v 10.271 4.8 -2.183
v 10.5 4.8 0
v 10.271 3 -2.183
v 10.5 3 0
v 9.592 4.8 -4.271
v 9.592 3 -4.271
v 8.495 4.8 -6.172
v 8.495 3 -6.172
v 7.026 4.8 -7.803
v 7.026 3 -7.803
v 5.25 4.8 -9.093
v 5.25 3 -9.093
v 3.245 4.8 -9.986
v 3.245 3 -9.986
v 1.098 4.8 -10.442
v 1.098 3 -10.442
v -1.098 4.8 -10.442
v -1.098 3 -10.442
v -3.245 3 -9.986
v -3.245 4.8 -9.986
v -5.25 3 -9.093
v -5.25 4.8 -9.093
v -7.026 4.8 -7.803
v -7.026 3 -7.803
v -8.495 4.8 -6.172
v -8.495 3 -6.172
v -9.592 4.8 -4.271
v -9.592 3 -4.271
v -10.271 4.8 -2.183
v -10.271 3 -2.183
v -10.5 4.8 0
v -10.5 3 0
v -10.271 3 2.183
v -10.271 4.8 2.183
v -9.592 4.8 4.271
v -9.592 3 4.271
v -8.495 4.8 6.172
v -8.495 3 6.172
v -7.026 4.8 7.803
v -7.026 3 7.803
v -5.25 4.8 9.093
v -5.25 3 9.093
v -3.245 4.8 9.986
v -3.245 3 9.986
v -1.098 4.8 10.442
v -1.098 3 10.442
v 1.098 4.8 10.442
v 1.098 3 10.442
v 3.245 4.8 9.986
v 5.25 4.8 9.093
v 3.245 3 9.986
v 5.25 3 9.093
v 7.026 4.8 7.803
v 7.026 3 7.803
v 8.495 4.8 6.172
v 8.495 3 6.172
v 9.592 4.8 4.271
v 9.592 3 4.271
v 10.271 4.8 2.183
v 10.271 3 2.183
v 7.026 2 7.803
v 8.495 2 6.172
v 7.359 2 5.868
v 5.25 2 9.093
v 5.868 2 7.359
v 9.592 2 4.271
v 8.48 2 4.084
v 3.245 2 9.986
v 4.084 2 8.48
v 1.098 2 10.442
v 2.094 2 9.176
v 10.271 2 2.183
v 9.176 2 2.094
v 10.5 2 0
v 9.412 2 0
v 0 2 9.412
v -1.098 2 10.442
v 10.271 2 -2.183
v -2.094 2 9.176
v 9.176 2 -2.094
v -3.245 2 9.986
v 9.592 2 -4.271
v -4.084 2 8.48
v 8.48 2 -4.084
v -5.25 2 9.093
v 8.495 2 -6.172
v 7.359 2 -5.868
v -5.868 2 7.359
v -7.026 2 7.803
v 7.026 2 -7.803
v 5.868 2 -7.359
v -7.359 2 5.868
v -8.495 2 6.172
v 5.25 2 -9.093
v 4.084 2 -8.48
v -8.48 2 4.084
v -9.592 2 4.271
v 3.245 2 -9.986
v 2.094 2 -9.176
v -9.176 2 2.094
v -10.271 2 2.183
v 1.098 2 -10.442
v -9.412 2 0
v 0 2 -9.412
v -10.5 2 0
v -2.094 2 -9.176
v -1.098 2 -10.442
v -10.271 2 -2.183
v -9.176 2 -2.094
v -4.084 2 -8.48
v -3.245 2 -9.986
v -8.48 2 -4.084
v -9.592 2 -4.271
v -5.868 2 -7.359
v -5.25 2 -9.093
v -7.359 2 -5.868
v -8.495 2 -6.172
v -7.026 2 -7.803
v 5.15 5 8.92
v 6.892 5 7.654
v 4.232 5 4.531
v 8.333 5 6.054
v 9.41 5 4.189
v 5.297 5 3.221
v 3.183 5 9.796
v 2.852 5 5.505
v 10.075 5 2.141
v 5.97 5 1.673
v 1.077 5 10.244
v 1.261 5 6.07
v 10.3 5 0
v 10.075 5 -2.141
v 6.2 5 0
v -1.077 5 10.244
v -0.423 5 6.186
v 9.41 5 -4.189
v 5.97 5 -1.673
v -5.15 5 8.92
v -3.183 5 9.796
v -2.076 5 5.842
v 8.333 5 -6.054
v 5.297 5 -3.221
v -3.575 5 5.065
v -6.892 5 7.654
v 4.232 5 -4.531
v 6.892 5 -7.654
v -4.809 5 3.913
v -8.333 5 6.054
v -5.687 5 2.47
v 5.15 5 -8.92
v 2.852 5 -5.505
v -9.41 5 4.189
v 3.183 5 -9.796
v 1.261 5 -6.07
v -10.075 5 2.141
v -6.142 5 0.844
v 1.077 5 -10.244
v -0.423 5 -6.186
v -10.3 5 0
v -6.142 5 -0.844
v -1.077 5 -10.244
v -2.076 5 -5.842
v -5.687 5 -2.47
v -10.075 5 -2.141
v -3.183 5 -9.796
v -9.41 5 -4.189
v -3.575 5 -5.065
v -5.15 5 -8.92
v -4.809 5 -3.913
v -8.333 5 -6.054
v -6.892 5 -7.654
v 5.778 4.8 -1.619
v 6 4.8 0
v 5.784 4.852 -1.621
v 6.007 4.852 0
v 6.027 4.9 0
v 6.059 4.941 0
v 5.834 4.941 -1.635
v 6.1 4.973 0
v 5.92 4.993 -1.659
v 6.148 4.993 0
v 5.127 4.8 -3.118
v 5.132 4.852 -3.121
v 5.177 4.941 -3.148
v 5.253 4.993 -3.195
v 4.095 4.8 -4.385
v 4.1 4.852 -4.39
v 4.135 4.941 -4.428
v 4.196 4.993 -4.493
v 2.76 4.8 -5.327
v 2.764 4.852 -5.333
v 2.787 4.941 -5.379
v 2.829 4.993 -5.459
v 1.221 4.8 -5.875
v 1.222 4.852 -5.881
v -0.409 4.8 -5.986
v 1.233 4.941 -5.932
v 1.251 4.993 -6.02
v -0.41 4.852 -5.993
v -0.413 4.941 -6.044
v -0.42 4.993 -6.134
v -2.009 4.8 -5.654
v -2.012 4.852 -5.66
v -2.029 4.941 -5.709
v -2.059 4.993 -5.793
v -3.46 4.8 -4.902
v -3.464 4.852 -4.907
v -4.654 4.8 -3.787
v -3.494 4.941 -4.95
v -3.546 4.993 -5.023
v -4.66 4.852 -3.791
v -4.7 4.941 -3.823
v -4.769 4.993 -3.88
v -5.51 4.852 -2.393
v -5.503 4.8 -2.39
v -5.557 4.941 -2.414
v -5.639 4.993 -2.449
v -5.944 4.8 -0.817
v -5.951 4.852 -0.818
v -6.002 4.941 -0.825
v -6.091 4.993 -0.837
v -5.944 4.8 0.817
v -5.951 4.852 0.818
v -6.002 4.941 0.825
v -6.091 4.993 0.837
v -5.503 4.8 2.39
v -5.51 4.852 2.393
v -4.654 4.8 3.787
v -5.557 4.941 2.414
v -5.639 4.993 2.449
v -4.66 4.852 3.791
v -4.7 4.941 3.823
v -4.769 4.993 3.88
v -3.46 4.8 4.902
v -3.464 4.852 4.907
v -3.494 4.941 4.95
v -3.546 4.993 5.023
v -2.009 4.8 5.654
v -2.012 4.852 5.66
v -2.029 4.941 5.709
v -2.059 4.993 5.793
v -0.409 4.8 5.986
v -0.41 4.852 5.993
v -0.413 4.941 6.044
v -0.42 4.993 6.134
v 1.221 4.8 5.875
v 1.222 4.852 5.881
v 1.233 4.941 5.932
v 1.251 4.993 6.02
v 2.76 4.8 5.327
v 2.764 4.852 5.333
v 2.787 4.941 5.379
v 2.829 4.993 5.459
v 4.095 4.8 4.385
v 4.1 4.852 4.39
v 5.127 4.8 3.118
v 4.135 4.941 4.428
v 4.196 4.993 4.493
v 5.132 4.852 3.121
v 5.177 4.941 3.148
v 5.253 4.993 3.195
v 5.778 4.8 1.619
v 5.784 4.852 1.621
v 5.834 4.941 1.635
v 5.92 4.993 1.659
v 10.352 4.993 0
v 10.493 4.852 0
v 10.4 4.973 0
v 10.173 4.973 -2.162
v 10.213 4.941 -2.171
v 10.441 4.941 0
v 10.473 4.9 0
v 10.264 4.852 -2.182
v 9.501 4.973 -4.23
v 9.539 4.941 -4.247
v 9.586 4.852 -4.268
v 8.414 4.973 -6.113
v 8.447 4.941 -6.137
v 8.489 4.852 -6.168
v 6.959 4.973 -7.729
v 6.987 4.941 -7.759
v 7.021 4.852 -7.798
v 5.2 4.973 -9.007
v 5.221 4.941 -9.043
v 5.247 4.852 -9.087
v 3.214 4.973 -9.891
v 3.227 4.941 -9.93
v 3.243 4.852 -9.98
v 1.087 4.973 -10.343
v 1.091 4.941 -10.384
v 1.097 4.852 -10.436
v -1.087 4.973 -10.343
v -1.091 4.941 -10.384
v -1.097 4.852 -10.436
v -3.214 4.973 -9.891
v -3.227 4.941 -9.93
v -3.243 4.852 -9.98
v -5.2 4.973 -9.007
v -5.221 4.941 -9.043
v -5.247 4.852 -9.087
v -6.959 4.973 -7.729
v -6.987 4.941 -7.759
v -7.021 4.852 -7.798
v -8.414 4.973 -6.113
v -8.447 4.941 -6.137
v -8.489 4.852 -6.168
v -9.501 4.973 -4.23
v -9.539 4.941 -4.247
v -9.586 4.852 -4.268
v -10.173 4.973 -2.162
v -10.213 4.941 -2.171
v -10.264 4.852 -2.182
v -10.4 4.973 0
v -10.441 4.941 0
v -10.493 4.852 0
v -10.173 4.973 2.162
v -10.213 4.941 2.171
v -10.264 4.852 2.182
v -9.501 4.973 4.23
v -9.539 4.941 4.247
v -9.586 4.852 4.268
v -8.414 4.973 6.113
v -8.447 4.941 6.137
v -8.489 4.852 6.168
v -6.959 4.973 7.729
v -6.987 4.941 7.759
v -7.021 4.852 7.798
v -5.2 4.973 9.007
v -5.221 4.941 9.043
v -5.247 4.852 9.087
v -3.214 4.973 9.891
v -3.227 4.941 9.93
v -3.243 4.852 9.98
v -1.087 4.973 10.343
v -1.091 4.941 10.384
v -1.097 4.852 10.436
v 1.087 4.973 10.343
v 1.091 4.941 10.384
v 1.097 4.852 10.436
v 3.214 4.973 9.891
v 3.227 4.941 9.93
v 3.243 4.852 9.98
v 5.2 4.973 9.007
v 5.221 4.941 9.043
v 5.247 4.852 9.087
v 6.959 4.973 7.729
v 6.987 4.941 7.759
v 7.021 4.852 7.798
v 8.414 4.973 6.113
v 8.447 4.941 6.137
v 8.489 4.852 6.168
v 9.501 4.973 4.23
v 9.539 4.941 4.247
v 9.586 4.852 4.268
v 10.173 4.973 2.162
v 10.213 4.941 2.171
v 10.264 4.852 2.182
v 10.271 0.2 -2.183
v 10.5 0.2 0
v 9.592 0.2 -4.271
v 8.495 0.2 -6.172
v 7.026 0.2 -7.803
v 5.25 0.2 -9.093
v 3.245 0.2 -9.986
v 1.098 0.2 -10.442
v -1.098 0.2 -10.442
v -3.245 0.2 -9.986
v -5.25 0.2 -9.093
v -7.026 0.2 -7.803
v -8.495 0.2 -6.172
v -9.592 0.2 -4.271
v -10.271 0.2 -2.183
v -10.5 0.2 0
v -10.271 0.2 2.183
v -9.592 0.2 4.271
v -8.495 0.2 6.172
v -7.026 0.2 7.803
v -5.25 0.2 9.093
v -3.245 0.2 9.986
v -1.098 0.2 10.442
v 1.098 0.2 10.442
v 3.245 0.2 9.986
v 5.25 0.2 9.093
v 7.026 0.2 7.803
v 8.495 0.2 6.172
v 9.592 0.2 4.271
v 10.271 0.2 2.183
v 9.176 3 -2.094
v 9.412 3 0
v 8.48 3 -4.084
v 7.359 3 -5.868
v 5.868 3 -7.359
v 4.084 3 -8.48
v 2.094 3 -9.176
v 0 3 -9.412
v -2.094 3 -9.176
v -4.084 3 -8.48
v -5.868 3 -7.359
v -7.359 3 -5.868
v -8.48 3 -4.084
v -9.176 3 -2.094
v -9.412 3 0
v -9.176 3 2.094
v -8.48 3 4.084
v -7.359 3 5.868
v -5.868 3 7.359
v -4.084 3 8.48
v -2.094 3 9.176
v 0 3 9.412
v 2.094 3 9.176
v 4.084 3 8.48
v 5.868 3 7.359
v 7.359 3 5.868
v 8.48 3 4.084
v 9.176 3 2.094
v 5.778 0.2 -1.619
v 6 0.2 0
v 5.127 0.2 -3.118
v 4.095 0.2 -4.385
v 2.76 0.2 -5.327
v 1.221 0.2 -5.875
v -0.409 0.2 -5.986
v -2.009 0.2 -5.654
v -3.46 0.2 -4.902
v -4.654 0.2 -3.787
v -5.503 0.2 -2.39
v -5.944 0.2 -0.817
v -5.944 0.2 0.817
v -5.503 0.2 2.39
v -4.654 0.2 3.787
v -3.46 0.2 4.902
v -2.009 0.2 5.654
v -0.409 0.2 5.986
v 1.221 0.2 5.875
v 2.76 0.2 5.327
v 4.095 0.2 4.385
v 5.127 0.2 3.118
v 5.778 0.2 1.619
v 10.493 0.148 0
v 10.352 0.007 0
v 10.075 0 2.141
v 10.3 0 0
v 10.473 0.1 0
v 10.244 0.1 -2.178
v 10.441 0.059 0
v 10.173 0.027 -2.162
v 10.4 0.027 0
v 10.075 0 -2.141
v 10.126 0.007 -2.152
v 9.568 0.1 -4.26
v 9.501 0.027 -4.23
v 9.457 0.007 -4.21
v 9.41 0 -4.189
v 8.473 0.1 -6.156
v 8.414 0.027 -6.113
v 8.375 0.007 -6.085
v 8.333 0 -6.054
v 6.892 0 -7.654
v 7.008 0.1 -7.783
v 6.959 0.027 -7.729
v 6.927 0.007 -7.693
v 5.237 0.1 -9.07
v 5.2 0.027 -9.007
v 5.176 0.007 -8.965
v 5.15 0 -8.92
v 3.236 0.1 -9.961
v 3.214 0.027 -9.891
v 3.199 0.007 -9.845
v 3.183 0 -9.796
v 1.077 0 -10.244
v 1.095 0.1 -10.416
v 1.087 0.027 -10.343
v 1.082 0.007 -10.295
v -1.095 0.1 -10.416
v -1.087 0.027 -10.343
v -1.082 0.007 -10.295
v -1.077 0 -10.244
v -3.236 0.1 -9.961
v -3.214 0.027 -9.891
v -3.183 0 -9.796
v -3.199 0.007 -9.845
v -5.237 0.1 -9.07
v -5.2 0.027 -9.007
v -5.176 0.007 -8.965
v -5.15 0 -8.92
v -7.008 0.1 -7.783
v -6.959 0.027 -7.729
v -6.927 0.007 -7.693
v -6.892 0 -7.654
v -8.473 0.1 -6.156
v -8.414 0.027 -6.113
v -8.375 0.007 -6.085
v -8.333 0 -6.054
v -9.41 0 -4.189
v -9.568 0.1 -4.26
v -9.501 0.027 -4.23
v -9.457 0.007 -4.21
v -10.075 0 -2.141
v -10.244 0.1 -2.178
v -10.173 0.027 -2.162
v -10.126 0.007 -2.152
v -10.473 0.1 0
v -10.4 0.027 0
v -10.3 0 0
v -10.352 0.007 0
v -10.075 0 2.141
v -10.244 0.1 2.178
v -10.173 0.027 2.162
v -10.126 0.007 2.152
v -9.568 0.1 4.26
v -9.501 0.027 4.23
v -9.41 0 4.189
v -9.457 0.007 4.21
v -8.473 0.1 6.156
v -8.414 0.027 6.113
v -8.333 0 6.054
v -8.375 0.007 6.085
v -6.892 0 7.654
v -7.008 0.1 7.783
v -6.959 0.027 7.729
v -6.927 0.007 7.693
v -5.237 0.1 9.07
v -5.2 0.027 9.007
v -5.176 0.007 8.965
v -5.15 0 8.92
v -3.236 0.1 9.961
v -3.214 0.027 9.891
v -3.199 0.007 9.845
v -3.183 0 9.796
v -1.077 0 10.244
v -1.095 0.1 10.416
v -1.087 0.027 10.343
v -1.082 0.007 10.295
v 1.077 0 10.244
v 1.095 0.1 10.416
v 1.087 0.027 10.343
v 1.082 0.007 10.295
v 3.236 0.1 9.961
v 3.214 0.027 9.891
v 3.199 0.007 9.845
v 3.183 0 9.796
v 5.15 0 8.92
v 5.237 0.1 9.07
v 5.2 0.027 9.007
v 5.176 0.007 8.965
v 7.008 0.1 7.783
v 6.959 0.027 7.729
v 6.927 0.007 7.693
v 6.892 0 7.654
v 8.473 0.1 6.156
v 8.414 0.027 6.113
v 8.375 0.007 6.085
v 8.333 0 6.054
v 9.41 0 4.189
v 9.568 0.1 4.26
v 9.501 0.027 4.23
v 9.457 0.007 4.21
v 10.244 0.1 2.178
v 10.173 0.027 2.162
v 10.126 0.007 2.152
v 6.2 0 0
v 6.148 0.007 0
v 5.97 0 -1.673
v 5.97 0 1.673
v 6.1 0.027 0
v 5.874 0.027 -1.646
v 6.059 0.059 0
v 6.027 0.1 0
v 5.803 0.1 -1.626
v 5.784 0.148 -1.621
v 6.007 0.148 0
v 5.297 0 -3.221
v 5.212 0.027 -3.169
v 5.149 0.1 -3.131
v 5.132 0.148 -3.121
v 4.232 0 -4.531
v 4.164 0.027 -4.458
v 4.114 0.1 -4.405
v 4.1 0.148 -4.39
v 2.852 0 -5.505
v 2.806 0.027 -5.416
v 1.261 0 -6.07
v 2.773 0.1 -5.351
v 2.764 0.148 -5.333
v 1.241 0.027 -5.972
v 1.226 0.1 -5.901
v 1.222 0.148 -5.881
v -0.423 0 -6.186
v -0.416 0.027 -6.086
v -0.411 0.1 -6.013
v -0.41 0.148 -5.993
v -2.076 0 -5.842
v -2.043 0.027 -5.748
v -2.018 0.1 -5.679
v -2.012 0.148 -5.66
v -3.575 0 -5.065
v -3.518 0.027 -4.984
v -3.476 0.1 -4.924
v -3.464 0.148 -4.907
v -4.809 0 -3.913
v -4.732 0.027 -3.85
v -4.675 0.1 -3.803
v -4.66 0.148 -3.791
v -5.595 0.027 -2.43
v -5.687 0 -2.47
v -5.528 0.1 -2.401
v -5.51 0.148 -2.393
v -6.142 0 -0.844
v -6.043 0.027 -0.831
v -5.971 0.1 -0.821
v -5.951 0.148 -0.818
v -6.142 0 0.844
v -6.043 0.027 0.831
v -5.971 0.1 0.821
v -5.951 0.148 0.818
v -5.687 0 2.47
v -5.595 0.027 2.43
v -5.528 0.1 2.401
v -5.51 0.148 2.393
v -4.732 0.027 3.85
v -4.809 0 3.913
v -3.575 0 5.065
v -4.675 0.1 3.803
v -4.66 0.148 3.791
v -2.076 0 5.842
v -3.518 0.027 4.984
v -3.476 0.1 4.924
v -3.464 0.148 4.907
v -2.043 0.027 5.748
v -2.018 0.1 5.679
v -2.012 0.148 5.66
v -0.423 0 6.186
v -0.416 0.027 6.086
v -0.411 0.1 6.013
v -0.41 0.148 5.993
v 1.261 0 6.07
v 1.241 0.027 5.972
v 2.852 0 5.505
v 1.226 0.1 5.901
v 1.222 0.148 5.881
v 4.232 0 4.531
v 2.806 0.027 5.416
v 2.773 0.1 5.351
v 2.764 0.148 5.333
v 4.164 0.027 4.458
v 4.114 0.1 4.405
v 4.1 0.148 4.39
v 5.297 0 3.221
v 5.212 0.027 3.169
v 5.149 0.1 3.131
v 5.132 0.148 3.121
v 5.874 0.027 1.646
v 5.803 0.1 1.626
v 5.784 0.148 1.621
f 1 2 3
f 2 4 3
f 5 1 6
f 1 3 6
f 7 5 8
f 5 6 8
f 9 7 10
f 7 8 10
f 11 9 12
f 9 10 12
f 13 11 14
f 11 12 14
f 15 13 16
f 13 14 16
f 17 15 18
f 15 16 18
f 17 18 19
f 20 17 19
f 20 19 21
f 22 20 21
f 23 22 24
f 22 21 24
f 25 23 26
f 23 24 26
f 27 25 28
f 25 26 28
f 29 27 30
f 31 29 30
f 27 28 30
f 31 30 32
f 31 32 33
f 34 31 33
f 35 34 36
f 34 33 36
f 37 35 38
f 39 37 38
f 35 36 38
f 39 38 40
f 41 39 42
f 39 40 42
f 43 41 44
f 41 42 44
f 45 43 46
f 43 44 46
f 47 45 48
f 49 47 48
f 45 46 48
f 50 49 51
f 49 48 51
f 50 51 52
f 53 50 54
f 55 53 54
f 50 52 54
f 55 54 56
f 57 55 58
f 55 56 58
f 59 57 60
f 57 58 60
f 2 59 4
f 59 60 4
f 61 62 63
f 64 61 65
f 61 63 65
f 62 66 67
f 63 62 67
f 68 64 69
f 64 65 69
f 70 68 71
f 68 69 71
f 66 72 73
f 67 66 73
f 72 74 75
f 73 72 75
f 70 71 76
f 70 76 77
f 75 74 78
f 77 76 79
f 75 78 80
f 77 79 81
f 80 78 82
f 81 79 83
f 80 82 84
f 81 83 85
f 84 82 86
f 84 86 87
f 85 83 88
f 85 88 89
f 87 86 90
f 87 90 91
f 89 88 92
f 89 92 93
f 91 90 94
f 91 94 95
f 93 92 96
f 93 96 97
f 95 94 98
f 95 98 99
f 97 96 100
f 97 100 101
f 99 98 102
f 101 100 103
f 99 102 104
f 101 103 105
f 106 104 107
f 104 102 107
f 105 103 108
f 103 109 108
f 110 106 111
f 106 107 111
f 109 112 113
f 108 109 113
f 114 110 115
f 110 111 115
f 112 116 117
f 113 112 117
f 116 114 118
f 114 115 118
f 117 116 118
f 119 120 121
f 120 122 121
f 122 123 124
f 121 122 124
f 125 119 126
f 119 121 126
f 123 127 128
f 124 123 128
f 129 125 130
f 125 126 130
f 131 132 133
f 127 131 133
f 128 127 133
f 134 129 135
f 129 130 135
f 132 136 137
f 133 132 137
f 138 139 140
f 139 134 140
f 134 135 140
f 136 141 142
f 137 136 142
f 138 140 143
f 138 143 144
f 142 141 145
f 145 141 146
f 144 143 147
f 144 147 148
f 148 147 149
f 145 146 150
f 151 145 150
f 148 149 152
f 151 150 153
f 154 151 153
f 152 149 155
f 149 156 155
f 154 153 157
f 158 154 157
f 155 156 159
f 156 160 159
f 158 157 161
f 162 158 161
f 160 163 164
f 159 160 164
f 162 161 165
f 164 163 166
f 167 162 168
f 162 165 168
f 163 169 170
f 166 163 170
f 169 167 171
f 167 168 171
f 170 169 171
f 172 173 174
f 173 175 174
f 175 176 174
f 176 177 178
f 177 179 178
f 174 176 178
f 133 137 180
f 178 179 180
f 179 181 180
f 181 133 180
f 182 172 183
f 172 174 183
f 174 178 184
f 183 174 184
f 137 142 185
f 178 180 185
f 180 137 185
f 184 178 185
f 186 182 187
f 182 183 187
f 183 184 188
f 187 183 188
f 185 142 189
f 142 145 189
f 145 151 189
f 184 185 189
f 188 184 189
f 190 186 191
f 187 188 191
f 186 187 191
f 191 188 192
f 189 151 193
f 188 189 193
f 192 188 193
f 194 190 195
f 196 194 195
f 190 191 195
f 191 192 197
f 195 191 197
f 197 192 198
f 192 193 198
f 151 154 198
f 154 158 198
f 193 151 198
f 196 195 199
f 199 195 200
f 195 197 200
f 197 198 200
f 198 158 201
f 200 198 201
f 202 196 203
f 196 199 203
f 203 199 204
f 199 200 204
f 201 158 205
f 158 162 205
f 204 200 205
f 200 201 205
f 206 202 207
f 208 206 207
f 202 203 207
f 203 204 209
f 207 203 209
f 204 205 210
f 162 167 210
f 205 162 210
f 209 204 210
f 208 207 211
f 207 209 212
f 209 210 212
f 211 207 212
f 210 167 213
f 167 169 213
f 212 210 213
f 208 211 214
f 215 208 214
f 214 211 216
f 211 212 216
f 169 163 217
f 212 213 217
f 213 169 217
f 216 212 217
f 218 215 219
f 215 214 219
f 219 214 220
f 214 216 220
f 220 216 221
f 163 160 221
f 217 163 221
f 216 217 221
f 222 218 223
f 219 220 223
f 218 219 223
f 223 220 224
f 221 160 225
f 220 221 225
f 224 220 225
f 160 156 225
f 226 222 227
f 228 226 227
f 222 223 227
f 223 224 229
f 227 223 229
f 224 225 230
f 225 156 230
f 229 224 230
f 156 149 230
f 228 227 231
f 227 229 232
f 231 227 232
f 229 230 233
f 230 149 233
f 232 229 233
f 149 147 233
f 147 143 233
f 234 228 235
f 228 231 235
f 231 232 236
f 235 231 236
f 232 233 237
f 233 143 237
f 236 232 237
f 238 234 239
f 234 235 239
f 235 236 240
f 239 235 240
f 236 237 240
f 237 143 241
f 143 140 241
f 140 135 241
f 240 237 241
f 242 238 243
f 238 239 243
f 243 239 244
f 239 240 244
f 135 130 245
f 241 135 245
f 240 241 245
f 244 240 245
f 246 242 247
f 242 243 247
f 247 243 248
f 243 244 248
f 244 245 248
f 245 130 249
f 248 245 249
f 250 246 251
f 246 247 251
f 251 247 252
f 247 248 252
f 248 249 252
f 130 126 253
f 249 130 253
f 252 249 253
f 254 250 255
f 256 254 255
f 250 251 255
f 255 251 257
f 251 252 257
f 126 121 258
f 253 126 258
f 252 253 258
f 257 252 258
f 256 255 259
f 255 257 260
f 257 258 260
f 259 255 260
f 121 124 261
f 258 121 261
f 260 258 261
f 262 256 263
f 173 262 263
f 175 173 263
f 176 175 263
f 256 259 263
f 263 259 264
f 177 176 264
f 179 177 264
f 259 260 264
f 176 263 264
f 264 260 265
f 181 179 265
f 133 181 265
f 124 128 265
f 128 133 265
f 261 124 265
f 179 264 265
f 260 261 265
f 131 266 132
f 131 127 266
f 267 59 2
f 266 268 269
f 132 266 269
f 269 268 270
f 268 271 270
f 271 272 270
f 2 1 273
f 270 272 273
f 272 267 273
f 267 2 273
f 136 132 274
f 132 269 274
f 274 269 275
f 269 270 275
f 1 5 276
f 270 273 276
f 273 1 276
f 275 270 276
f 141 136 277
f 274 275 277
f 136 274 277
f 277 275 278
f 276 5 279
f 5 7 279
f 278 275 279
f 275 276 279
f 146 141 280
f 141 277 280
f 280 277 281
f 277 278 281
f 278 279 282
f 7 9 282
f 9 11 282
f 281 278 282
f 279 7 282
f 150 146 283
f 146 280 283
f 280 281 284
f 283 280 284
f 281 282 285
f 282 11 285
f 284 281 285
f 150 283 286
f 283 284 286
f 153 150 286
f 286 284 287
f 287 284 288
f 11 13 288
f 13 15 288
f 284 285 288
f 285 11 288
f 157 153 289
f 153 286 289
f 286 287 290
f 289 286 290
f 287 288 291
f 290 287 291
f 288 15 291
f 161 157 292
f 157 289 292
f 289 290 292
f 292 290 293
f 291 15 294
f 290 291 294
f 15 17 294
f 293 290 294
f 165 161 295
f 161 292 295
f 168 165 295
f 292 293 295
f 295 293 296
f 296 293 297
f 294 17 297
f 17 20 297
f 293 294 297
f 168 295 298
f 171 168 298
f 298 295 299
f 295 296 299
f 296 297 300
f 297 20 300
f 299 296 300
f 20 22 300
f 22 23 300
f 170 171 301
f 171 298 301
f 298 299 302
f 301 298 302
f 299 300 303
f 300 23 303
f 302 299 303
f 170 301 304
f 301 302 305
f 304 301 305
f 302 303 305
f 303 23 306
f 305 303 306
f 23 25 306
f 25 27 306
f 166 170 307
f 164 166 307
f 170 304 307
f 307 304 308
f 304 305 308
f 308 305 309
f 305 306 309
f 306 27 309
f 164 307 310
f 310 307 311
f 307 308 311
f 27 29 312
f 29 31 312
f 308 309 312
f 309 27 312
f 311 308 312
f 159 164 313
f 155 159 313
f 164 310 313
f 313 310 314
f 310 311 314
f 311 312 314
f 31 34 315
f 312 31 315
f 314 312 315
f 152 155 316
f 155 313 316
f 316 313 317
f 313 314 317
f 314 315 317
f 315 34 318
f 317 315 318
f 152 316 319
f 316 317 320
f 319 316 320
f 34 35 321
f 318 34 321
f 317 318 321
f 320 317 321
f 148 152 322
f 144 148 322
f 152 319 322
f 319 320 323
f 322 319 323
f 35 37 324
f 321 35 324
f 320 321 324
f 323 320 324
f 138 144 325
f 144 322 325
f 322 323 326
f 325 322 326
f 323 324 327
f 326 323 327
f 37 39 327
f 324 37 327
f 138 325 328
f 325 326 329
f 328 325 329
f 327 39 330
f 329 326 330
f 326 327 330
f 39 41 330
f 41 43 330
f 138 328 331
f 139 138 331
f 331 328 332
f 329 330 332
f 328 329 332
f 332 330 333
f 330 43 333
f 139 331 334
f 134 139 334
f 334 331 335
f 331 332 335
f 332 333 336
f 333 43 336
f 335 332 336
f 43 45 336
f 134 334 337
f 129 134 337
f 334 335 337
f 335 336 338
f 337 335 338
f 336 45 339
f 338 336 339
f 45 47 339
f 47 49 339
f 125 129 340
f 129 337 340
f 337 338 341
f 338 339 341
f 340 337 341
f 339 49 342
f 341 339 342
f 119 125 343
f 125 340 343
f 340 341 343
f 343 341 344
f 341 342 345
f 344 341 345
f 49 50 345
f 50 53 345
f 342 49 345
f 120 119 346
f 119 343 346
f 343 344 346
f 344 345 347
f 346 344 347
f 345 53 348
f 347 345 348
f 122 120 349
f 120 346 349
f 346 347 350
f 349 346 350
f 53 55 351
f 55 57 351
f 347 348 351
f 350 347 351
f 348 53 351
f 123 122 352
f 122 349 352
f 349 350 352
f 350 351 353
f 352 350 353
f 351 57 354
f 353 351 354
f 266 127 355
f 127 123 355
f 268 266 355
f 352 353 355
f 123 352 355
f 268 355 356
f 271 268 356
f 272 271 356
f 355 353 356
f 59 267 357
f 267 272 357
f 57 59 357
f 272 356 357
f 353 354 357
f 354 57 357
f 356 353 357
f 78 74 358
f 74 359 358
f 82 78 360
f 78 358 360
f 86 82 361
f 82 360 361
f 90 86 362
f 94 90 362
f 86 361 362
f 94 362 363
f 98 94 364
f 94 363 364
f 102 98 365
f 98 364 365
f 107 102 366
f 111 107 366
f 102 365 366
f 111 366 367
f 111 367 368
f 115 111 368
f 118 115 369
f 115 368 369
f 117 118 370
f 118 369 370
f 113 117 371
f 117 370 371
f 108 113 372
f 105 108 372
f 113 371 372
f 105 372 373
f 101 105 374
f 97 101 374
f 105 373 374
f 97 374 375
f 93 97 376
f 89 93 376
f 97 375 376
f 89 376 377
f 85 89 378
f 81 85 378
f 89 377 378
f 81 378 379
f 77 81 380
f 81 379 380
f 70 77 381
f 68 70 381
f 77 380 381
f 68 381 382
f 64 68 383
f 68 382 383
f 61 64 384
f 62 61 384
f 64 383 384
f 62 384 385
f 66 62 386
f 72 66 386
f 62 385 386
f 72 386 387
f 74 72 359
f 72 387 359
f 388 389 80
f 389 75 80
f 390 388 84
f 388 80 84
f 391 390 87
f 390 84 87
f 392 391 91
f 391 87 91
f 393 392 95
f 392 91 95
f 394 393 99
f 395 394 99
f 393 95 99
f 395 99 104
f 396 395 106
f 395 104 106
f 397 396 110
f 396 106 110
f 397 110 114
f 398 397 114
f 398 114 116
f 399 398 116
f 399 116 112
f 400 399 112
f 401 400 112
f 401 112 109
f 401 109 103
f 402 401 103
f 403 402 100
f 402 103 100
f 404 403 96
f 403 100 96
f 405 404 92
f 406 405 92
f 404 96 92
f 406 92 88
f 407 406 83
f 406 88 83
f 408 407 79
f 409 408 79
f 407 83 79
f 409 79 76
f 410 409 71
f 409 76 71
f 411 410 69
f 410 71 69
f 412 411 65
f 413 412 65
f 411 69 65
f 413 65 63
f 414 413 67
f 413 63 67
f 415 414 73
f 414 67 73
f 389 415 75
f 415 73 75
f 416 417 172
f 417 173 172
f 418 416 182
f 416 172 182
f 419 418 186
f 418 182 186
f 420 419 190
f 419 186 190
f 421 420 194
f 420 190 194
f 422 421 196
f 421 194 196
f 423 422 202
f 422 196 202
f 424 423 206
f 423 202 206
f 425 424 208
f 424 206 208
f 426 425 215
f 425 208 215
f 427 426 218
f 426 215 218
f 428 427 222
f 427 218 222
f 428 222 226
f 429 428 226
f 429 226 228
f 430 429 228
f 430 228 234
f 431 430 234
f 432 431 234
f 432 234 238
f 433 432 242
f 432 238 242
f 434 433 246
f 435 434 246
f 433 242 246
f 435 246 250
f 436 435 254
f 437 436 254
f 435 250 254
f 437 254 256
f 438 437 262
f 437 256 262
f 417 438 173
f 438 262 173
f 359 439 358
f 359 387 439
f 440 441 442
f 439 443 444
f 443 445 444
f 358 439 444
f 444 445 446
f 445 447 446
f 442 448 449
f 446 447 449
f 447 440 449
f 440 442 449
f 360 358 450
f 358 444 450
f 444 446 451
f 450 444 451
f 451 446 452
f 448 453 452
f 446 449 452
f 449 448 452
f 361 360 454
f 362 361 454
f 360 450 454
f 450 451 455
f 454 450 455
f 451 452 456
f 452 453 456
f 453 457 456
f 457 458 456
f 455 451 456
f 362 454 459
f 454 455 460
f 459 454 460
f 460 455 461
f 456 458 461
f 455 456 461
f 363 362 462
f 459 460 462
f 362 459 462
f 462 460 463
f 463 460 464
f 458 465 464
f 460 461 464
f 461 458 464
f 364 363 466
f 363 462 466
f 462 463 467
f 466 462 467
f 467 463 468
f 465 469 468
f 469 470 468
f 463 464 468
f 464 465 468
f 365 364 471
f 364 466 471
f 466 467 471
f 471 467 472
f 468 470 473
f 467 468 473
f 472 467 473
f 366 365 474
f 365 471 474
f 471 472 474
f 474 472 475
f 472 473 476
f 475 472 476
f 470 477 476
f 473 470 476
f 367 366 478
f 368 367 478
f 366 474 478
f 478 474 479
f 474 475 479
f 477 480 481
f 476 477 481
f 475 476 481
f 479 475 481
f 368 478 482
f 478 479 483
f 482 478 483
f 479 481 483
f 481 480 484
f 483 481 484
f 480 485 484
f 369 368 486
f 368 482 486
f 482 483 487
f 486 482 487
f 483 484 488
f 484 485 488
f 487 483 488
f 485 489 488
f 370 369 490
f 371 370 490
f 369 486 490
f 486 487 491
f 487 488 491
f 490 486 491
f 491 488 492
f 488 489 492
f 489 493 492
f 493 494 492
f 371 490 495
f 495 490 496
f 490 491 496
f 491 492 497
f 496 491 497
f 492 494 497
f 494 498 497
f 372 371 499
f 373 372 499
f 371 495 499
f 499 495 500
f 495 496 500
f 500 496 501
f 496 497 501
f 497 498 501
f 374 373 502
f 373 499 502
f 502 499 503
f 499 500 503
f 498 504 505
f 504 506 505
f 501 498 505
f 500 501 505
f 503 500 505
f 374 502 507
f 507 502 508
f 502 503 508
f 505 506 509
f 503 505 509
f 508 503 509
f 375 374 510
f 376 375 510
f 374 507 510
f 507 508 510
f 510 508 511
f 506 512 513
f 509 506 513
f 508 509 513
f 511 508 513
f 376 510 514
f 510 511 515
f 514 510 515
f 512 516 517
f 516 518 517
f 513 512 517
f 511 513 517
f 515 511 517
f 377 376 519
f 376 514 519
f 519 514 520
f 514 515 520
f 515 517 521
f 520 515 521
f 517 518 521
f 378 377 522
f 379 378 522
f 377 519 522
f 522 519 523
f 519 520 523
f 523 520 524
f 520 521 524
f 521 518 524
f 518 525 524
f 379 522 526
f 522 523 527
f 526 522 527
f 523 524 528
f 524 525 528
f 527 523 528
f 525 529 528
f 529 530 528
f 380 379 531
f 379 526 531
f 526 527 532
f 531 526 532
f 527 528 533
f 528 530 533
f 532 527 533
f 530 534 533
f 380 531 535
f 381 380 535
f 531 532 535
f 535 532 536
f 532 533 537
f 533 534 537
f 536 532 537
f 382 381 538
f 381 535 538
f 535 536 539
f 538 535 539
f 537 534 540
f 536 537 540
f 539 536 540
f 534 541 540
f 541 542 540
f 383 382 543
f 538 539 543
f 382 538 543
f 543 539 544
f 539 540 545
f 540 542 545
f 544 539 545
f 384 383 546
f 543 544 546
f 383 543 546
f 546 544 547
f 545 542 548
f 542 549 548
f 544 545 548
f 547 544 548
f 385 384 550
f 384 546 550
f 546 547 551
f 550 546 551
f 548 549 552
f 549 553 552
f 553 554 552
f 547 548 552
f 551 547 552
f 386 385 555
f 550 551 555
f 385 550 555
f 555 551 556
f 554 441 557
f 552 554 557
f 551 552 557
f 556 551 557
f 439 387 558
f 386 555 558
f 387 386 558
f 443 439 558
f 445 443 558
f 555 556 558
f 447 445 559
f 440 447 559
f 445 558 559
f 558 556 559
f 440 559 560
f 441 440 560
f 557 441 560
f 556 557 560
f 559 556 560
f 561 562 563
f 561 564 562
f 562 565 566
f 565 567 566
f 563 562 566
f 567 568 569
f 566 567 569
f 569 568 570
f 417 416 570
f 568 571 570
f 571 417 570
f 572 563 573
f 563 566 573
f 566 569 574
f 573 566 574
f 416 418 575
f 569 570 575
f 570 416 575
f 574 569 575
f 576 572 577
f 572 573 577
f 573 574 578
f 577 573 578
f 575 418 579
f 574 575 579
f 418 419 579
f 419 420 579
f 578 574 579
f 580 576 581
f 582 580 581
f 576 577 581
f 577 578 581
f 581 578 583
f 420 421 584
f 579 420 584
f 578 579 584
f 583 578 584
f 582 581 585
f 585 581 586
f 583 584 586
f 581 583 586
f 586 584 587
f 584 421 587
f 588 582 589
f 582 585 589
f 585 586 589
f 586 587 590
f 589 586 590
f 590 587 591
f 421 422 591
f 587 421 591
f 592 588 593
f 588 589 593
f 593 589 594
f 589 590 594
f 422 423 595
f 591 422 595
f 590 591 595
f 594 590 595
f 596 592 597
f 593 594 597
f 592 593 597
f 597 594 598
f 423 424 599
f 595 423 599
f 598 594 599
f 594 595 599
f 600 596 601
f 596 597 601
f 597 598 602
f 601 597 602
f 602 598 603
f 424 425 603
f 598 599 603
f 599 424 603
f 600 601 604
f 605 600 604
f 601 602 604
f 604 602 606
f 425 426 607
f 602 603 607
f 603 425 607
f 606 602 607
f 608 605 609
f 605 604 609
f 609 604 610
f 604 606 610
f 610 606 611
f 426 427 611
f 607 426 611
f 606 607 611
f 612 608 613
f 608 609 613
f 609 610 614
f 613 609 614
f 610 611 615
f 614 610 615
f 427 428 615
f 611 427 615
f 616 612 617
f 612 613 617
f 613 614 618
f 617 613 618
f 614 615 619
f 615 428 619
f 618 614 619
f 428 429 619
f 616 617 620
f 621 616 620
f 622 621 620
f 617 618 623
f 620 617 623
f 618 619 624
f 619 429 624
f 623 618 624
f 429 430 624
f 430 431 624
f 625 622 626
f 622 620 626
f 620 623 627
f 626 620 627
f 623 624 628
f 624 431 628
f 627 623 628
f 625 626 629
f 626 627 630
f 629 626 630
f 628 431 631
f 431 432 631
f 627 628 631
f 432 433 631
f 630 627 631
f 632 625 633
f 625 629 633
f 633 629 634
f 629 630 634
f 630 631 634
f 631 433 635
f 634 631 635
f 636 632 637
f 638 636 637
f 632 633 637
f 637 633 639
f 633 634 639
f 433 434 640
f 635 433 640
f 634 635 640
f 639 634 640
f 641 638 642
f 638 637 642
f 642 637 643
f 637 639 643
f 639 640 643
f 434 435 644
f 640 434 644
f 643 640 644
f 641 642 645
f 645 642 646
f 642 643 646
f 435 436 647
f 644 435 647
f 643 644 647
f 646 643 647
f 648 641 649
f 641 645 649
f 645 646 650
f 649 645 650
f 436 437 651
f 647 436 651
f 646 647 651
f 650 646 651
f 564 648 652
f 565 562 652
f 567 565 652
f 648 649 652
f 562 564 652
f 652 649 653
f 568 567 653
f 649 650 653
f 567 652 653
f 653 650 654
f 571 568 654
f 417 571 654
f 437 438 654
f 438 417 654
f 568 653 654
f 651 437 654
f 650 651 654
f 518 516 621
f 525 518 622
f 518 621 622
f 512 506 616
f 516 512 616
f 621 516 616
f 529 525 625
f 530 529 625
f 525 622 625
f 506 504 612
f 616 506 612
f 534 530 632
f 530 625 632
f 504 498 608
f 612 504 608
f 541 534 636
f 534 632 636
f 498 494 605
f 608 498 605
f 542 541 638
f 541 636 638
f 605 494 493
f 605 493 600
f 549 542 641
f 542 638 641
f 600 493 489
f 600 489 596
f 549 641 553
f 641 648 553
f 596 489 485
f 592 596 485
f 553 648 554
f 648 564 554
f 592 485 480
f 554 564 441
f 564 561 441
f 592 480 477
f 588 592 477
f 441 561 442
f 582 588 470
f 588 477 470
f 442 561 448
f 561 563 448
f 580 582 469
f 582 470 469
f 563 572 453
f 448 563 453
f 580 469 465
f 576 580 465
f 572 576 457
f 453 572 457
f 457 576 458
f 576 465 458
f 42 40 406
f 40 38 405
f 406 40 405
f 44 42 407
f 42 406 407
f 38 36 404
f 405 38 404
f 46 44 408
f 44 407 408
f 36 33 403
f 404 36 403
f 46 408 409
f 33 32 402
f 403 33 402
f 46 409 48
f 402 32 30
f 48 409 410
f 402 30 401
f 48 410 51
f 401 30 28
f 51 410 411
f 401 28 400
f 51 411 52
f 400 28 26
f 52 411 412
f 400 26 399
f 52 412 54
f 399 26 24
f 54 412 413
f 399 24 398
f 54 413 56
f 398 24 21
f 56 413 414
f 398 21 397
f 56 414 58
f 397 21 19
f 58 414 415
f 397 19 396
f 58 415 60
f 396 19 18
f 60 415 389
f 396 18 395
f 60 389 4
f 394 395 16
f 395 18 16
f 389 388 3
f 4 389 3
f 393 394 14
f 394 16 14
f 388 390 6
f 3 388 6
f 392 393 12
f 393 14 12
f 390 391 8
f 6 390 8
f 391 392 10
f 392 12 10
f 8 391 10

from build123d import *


with BuildPart() as part:
    # Sketch1 → Revolve1 (revolve)
    with BuildSketch(Plane.XY):
        with BuildLine():
            Line((6, 0.2), (6, 4.8))
            ThreePointArc((6, 4.8), (6.058578644, 4.941421356), (6.2, 5))
            Line((6.2, 5), (10.3, 5))
            ThreePointArc((10.3, 5), (10.441421356, 4.941421356), (10.5, 4.8))
            Line((10.5, 4.8), (10.5, 3))
            Line((10.5, 3), (9.411915576, 3))
            Line((9.411915576, 3), (9.411915576, 2))
            Line((9.411915576, 2), (10.5, 2))
            Line((10.5, 2), (10.5, 0.2))
            ThreePointArc((10.5, 0.2), (10.441421356, 0.058578644), (10.3, 0))
            Line((10.3, 0), (6.2, 0))
            ThreePointArc((6.2, 0), (6.058578644, 0.058578644), (6, 0.2))
        make_face()
    revolve(axis=Axis((0, 0, 0), (0, 1, 0)))


solid = part.part
